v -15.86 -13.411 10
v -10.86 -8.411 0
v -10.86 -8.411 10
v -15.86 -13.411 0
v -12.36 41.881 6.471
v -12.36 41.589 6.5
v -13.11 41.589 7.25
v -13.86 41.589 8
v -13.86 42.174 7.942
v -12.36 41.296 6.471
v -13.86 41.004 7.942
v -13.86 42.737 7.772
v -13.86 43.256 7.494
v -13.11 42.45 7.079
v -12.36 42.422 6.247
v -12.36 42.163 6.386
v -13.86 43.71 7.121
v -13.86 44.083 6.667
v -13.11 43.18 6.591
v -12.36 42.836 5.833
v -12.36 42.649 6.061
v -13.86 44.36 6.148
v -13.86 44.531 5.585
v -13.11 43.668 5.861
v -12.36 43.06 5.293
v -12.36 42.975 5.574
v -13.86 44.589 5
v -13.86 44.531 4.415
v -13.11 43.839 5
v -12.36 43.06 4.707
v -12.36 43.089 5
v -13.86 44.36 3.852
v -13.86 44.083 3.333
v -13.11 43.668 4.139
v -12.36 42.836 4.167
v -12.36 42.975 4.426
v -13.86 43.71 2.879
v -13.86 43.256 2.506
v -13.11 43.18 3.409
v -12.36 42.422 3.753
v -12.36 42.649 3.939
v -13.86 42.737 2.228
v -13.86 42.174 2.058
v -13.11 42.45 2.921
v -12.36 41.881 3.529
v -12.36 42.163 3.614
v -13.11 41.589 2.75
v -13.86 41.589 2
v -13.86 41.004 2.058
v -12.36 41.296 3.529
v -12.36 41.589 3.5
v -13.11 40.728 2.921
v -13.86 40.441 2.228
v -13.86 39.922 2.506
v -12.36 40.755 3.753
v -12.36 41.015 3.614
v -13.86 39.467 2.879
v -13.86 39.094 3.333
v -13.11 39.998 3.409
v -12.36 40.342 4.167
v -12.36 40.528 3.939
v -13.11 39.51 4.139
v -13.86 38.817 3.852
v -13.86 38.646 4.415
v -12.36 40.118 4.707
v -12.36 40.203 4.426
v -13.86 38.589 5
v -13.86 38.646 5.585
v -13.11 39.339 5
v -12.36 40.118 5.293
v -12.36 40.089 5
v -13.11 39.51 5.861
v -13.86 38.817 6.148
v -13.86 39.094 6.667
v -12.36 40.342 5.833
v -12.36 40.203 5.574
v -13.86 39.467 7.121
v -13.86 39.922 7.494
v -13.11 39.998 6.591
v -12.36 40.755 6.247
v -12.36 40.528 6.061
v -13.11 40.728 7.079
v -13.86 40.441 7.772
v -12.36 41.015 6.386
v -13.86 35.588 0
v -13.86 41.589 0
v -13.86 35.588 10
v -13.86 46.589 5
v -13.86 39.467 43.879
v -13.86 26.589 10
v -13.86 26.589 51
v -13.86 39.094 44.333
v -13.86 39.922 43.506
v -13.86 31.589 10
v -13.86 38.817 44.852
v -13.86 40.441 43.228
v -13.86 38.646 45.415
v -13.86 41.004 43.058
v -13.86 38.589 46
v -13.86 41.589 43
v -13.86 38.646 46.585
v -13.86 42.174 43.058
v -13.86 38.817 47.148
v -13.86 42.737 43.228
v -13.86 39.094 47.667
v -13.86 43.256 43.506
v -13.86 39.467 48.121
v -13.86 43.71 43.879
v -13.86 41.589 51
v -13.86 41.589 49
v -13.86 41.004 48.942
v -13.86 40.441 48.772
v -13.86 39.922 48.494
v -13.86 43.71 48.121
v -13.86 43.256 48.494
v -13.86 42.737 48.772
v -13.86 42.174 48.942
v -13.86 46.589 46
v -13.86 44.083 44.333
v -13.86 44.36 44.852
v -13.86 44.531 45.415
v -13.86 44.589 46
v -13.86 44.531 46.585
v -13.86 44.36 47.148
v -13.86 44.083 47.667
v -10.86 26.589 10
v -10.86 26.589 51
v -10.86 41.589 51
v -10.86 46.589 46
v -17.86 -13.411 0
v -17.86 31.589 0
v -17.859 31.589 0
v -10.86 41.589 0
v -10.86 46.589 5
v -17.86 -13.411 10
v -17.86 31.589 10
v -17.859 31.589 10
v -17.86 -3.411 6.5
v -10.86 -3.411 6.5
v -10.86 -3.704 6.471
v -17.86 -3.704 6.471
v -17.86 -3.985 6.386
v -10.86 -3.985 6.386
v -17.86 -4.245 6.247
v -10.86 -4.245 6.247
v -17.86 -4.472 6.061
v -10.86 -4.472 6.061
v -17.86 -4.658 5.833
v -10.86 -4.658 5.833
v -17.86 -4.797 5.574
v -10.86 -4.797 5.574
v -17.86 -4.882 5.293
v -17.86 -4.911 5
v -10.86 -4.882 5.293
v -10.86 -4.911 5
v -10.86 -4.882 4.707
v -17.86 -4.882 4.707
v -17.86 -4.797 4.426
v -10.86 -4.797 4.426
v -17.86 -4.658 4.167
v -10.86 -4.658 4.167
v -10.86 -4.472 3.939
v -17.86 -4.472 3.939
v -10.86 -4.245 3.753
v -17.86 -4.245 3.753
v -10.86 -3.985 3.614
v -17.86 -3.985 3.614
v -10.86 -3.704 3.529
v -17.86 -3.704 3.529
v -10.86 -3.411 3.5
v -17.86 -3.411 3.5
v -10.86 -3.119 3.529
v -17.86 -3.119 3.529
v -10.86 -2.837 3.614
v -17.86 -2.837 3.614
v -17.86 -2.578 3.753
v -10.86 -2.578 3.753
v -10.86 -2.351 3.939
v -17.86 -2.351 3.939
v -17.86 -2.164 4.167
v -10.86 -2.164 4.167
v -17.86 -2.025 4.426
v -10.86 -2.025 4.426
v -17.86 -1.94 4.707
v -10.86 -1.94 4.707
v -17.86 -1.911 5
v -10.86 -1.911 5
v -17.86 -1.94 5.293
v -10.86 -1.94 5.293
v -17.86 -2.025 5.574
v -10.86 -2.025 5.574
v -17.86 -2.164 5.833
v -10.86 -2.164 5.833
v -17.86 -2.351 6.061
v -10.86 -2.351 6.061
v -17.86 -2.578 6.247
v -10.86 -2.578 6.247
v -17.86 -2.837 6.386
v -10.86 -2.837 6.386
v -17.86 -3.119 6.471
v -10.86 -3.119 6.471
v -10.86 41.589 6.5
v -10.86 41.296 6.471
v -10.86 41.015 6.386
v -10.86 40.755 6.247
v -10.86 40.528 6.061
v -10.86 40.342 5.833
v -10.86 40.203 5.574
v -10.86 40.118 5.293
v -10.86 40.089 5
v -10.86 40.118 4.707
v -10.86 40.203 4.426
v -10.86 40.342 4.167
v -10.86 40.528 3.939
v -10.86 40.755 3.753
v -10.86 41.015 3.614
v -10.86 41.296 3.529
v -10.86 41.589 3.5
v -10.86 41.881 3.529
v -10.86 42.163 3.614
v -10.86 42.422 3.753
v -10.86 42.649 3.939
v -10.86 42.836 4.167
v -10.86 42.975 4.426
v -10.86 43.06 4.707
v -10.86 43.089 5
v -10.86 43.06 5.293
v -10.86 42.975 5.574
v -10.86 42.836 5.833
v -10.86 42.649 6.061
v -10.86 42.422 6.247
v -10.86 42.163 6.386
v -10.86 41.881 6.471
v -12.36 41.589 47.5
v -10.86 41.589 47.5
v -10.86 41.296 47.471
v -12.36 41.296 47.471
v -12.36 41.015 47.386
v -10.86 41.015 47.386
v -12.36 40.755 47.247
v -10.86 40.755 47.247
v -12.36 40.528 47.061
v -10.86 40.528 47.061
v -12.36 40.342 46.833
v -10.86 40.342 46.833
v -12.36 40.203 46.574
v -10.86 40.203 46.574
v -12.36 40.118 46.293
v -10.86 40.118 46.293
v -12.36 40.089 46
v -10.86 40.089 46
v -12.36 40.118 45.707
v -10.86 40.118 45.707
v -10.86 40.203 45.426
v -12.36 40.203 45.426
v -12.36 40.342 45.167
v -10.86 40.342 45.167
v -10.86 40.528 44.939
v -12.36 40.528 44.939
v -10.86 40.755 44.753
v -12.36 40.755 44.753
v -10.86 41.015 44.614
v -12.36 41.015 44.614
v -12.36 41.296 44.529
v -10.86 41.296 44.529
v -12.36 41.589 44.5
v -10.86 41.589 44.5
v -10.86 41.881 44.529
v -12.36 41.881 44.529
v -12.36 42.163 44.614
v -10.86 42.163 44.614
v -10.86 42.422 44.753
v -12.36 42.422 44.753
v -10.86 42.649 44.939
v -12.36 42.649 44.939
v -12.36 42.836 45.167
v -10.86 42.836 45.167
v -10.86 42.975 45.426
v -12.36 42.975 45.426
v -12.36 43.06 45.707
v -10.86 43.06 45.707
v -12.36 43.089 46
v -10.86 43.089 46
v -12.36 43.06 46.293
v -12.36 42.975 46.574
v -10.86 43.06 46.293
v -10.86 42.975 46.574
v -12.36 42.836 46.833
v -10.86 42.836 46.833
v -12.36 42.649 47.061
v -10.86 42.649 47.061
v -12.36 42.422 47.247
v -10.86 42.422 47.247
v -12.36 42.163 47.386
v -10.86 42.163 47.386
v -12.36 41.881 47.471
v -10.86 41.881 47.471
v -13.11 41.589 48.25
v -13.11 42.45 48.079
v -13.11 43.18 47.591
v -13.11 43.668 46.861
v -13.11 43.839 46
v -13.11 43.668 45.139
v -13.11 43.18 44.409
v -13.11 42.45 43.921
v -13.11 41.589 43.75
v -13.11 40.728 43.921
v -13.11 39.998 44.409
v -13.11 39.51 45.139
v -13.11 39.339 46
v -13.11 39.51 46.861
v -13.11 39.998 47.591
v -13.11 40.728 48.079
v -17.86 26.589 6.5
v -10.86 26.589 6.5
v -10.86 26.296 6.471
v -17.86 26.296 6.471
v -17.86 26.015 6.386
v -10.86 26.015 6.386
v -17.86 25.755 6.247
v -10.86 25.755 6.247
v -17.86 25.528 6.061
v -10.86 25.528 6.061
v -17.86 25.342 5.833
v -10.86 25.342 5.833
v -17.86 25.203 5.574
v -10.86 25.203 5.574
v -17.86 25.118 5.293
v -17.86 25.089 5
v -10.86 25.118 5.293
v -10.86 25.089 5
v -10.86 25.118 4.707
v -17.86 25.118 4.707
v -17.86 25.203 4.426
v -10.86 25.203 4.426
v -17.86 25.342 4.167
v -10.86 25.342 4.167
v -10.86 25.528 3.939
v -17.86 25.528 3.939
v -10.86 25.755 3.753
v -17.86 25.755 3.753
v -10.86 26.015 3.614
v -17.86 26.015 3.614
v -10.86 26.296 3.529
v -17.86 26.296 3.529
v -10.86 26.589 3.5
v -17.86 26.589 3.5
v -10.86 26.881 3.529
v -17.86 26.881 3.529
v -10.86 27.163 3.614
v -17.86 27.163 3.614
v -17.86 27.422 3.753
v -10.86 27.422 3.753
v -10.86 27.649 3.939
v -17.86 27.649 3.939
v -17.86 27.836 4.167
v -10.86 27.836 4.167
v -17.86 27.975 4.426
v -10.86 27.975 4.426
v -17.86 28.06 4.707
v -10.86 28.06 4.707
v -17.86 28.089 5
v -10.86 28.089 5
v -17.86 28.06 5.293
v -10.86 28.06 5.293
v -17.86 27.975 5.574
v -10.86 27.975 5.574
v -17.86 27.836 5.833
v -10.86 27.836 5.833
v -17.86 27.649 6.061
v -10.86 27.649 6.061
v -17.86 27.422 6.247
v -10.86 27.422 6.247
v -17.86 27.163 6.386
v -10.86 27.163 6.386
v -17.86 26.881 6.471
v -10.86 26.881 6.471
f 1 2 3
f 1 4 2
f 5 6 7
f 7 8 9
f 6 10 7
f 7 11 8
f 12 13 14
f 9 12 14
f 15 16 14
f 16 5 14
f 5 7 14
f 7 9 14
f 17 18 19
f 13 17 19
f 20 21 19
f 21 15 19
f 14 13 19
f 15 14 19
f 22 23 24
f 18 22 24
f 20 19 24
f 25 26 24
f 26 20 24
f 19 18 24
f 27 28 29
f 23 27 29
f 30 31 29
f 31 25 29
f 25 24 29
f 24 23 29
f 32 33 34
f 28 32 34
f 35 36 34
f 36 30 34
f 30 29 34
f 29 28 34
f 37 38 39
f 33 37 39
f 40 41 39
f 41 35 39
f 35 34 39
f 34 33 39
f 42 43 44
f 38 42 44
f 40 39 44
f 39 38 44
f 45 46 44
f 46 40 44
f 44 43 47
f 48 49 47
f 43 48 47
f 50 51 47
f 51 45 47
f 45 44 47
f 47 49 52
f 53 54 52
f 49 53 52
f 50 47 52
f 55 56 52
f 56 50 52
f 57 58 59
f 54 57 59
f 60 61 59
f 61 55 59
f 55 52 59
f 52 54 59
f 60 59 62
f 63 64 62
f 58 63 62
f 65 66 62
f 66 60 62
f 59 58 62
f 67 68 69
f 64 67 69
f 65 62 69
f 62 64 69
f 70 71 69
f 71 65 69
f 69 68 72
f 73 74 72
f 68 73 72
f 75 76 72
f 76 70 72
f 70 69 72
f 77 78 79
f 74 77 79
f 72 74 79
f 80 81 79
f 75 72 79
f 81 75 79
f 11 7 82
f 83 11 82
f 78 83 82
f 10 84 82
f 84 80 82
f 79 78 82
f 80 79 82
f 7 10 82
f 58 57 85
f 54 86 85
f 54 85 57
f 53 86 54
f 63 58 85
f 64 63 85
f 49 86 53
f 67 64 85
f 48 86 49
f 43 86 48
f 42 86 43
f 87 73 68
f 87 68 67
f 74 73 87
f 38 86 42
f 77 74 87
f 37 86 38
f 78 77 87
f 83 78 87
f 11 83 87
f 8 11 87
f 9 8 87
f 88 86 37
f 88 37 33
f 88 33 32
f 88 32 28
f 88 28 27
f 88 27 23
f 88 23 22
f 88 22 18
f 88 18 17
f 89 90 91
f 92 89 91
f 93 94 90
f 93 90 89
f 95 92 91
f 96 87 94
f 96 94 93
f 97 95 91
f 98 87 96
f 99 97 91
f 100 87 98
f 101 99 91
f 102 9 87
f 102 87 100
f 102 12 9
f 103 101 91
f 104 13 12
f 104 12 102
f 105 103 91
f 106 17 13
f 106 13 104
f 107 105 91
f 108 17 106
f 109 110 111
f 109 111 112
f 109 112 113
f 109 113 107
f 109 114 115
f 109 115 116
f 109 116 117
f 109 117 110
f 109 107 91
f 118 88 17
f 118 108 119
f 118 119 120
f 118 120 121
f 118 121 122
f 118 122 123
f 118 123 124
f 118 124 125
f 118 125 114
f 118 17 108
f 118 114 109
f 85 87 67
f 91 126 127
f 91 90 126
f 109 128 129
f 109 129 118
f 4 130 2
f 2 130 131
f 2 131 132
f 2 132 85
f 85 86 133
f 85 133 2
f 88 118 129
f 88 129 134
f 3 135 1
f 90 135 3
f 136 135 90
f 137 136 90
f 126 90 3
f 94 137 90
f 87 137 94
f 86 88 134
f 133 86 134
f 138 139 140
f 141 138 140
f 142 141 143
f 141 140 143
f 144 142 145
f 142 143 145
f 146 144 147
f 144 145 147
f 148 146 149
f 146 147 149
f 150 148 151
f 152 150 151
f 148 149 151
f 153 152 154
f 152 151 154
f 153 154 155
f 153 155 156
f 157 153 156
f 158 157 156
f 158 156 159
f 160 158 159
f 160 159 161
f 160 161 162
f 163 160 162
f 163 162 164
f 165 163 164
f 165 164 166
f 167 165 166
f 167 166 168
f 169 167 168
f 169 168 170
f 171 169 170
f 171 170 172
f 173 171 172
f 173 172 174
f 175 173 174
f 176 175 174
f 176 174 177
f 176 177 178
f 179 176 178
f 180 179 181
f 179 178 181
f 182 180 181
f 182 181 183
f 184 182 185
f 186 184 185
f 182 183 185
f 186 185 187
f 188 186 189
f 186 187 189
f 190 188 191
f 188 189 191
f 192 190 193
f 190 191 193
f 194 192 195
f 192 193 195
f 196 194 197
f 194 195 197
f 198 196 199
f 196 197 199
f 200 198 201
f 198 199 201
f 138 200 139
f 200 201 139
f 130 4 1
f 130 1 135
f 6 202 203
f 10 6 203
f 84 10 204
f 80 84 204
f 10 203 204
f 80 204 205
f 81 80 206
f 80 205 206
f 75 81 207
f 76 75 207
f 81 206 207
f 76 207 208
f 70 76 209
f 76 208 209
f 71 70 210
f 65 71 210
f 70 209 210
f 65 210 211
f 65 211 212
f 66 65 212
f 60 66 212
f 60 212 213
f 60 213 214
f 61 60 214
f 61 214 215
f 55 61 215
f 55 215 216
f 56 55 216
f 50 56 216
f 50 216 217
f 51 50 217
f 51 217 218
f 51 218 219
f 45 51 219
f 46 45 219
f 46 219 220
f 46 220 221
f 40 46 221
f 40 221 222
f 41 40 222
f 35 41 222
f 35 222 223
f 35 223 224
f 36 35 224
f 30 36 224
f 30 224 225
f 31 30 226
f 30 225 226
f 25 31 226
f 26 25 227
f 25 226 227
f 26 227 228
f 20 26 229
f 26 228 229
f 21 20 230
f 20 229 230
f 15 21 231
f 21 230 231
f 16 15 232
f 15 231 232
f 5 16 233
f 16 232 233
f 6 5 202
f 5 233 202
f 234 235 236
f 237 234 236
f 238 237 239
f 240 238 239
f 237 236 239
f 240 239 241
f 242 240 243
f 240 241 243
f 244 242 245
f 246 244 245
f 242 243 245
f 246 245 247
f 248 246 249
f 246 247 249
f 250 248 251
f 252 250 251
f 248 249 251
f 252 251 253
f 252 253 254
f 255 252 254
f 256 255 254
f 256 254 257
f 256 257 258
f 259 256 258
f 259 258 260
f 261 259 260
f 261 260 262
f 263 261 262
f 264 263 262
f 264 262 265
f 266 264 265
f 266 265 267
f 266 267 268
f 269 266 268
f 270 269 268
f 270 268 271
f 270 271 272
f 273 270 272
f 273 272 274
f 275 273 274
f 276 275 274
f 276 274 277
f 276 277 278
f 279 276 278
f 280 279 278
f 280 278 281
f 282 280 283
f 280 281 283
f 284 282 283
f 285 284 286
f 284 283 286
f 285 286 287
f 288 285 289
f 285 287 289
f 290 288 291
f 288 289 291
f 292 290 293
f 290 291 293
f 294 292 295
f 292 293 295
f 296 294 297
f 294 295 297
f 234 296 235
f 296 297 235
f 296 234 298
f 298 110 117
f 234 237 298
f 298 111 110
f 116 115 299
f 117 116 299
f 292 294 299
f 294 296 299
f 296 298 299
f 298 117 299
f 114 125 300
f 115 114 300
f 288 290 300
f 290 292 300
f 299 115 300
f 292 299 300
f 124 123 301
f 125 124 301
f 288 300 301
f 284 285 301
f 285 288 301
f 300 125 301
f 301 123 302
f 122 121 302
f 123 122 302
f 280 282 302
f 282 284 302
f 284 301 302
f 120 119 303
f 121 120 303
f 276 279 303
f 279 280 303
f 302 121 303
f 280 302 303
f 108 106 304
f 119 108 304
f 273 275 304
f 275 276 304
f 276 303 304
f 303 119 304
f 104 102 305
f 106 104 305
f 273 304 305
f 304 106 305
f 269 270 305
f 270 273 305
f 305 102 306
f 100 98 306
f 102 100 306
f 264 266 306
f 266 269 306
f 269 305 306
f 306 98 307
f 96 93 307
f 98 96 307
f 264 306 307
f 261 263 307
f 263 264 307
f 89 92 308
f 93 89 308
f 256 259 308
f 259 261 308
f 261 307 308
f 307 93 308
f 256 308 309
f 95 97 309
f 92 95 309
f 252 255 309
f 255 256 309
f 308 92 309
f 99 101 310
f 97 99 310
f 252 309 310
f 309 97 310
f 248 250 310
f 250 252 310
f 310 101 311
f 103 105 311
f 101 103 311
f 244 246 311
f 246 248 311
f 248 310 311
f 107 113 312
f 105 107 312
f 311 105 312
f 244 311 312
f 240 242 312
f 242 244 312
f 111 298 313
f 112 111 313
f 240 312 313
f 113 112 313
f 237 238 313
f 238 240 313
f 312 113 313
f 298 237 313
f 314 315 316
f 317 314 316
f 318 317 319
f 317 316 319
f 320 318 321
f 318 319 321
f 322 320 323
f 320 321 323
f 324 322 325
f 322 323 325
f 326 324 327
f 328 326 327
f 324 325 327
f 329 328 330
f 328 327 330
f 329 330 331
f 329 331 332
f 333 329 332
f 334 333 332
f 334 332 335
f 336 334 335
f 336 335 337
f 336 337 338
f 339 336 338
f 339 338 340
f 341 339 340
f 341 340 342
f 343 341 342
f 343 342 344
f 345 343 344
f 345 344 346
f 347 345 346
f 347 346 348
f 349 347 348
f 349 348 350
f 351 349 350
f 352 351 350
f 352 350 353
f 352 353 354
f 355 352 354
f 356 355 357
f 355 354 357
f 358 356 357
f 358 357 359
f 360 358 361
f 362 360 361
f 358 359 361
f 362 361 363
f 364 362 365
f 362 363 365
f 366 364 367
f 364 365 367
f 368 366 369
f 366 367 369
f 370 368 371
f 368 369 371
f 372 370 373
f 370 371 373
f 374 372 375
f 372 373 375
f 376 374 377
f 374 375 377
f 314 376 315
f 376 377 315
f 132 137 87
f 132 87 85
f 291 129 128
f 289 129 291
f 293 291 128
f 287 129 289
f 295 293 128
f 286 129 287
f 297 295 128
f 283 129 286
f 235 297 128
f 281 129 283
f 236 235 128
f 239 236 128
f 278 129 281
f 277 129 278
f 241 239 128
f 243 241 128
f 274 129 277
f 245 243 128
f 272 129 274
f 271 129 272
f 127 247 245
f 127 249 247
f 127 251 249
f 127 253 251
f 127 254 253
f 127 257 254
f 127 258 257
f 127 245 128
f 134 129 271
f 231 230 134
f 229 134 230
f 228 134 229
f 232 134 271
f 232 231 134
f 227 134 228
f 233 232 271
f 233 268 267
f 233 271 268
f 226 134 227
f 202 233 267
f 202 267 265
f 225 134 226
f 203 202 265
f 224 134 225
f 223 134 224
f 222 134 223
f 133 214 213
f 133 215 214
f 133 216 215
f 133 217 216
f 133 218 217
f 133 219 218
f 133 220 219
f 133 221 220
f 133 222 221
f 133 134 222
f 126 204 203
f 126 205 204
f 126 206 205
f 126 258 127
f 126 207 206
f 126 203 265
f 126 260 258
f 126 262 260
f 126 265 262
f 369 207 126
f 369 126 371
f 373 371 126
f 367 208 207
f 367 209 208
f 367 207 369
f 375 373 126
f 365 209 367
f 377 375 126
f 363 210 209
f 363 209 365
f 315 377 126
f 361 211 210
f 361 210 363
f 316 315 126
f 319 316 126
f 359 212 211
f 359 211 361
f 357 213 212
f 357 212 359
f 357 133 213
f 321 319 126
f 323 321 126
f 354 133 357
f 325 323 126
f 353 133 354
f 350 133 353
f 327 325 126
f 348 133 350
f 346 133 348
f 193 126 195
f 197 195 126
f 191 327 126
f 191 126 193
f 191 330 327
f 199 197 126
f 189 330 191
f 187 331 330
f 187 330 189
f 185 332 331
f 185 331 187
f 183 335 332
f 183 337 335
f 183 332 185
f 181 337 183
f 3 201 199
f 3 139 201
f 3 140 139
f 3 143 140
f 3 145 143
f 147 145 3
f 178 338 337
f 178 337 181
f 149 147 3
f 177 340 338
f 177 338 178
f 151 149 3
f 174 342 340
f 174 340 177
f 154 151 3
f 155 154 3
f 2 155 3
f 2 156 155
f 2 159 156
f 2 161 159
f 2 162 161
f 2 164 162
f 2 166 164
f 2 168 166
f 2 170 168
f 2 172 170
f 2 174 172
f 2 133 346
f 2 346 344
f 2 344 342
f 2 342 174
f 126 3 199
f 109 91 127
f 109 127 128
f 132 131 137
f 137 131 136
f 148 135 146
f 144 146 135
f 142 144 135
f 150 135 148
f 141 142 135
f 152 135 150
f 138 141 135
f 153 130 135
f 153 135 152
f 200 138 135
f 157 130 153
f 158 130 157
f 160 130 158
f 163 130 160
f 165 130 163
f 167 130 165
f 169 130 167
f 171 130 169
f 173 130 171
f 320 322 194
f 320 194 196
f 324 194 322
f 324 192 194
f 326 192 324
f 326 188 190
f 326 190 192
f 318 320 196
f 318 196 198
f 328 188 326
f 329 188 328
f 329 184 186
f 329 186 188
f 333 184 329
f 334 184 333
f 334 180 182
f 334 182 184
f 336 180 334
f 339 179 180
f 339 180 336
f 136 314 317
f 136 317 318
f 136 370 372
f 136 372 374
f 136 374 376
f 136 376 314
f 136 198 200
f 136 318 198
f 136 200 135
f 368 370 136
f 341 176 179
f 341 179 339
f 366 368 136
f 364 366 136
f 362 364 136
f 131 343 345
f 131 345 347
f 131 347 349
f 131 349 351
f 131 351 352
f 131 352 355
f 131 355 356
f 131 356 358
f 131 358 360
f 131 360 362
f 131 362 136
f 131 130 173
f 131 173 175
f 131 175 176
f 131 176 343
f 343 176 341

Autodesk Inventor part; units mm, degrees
ref_plane "YZ Plane" through (0, 0, 0) normal (1, 0, 0) x (0, 1, 0)
ref_plane "XZ Plane" through (0, 0, 0) normal (0, 1, 0) x (-1, 0, 0)
ref_plane "XY Plane" through (0, 0, 0) normal (0, 0, 1) x (1, 0, 0)
sketch "Sketch1" plane through (0, 0, 0) normal (0, 0, 1) x (1, 0, 0)
  line L0 (-17.8598, 36.5888) -> (-10.8598, 36.5888)
  line L1 (-10.8598, 36.5888) -> (-10.8598, -13.4112)
  line L2 (-10.8598, -13.4112) -> (-17.8598, -13.4112)
  line L3 (-17.8598, -13.4112) -> (-17.8598, 36.5888)
  point P0 (0, 0)
  dimension "d0" = 7
  dimension "d1" = 50
extrude "Extrusion1" add sketch "Sketch1" along normal blind 10
sketch "Sketch2" plane through (-17.8598, -13.4112, 0) normal (-1, 0, 0) x (0, 0, 1)
  line L0 (0, 0) -> (10, 0) projected
  line L1 (0, 50) -> (0, 0) projected
  point P0 (0, 13.4112)
  point P1 (5, 10)
  point P2 (5, 40)
  dimension "d4" = 10
  dimension "d5" = 5
  dimension "d6" = 5
  dimension "d7" = 30
hole "Hole1" at (-17.8598, -3.4112, 5) at (-17.8598, 26.5888, 5) direction (1, 0, 0) diameter 3 depth 7 tip angle 118
chamfer "Chamfer1" distance 5 angle 45 1 edges at (-10.8598, -13.4112, 5)
sketch "Sketch3" plane through (-17.8598, -13.4112, 0) normal (-1, 0, 0) x (0, 0, 1)
  line L0 (0, 50) -> (51, 50)
  line L1 (51, 50) -> (51, 60)
  line L2 (51, 60) -> (0, 60)
  line L3 (0, 60) -> (0, 50)
  line L4 (10, 50) -> (10, 0) projected
  line L5 (10, 40) -> (51, 40)
  line L6 (51, 40) -> (51, 50)
  line L7 (51, 50) -> (10, 50)
  line L8 (10, 50) -> (10, 40)
  point P0 (0, 13.4112)
  dimension "d18" = 51
  dimension "d19" = 10
  dimension "d20" = 10
extrude "Extrusion2" add sketch "Sketch3" against normal blind 7
sketch "Sketch4" plane through (-17.8598, -13.4112, 0) normal (-1, 0, 0) x (0, 0, 1)
  line L0 (0, 60) -> (51, 60) projected
  line L1 (51, 40) -> (10, 40)
  line L2 (10, 40) -> (10, 60)
  line L3 (10, 60) -> (51, 60)
  line L4 (51, 60) -> (51, 40)
  line L5 (10, 40) -> (10, 0) projected
  line L6 (0, 60) -> (0, 5) projected
  line L7 (10, 60) -> (0, 60)
  line L8 (0, 60) -> (0, 45)
  line L9 (0, 45) -> (10, 45)
  line L10 (10, 45) -> (10, 60)
  point P0 (0, 13.4112)
  dimension "d23" = 15
extrude "Extrusion3" cut sketch "Sketch4" against normal blind 4
sketch "Sketch5" plane through (-13.8598, -13.4112, 0) normal (-1, 0, 0) x (0, 0, 1)
  line L0 (51, 60) -> (51, 40) projected
  line L1 (0, 45) -> (0, 60) projected
  line L2 (0, 60) -> (51, 60) projected
  point P0 (0, 13.4112)
  point P1 (5, 55)
  point P2 (46, 55)
  dimension "d26" = 5
  dimension "d27" = 5
  dimension "d28" = 5
  dimension "d29" = 5
hole "Hole2" at (-13.8598, 41.5888, 5) at (-13.8598, 41.5888, 46) direction (1, 0, 0) diameter 3 depth 7 tip angle 118 countersink diameter 6 countersink angle 90
chamfer "Chamfer2" distance 5 angle 45 2 edges at (-12.3598, 46.5888, 51) (-12.3598, 46.5888, 0)
chamfer "Chamfer3" distance 4 angle 45 1 edges at (-13.8598, 31.5888, 5)
sketch "Sketch6" plane through (-13.8598, -13.4112, 0) normal (-1, 0, 0) x (0, 0, 1)
  circle A0 centre (46, 55) radius 1.5 projected
  circle A1 centre (5, 55) radius 1.5 projected
  point P0 (0, 13.4112)
  dimension "d43" = 41
sketch "Sketch7" plane through (-13.8598, -13.4112, 0) normal (-1, 0, 0) x (0, 0, 1)
  line L0 (0, 49) -> (0, 55) projected
  circle A0 centre (5, 55) radius 1.5 projected
  point P0 (0, 13.4112)
  dimension "d44" = 5
properties part number "Z-stepper connector"
